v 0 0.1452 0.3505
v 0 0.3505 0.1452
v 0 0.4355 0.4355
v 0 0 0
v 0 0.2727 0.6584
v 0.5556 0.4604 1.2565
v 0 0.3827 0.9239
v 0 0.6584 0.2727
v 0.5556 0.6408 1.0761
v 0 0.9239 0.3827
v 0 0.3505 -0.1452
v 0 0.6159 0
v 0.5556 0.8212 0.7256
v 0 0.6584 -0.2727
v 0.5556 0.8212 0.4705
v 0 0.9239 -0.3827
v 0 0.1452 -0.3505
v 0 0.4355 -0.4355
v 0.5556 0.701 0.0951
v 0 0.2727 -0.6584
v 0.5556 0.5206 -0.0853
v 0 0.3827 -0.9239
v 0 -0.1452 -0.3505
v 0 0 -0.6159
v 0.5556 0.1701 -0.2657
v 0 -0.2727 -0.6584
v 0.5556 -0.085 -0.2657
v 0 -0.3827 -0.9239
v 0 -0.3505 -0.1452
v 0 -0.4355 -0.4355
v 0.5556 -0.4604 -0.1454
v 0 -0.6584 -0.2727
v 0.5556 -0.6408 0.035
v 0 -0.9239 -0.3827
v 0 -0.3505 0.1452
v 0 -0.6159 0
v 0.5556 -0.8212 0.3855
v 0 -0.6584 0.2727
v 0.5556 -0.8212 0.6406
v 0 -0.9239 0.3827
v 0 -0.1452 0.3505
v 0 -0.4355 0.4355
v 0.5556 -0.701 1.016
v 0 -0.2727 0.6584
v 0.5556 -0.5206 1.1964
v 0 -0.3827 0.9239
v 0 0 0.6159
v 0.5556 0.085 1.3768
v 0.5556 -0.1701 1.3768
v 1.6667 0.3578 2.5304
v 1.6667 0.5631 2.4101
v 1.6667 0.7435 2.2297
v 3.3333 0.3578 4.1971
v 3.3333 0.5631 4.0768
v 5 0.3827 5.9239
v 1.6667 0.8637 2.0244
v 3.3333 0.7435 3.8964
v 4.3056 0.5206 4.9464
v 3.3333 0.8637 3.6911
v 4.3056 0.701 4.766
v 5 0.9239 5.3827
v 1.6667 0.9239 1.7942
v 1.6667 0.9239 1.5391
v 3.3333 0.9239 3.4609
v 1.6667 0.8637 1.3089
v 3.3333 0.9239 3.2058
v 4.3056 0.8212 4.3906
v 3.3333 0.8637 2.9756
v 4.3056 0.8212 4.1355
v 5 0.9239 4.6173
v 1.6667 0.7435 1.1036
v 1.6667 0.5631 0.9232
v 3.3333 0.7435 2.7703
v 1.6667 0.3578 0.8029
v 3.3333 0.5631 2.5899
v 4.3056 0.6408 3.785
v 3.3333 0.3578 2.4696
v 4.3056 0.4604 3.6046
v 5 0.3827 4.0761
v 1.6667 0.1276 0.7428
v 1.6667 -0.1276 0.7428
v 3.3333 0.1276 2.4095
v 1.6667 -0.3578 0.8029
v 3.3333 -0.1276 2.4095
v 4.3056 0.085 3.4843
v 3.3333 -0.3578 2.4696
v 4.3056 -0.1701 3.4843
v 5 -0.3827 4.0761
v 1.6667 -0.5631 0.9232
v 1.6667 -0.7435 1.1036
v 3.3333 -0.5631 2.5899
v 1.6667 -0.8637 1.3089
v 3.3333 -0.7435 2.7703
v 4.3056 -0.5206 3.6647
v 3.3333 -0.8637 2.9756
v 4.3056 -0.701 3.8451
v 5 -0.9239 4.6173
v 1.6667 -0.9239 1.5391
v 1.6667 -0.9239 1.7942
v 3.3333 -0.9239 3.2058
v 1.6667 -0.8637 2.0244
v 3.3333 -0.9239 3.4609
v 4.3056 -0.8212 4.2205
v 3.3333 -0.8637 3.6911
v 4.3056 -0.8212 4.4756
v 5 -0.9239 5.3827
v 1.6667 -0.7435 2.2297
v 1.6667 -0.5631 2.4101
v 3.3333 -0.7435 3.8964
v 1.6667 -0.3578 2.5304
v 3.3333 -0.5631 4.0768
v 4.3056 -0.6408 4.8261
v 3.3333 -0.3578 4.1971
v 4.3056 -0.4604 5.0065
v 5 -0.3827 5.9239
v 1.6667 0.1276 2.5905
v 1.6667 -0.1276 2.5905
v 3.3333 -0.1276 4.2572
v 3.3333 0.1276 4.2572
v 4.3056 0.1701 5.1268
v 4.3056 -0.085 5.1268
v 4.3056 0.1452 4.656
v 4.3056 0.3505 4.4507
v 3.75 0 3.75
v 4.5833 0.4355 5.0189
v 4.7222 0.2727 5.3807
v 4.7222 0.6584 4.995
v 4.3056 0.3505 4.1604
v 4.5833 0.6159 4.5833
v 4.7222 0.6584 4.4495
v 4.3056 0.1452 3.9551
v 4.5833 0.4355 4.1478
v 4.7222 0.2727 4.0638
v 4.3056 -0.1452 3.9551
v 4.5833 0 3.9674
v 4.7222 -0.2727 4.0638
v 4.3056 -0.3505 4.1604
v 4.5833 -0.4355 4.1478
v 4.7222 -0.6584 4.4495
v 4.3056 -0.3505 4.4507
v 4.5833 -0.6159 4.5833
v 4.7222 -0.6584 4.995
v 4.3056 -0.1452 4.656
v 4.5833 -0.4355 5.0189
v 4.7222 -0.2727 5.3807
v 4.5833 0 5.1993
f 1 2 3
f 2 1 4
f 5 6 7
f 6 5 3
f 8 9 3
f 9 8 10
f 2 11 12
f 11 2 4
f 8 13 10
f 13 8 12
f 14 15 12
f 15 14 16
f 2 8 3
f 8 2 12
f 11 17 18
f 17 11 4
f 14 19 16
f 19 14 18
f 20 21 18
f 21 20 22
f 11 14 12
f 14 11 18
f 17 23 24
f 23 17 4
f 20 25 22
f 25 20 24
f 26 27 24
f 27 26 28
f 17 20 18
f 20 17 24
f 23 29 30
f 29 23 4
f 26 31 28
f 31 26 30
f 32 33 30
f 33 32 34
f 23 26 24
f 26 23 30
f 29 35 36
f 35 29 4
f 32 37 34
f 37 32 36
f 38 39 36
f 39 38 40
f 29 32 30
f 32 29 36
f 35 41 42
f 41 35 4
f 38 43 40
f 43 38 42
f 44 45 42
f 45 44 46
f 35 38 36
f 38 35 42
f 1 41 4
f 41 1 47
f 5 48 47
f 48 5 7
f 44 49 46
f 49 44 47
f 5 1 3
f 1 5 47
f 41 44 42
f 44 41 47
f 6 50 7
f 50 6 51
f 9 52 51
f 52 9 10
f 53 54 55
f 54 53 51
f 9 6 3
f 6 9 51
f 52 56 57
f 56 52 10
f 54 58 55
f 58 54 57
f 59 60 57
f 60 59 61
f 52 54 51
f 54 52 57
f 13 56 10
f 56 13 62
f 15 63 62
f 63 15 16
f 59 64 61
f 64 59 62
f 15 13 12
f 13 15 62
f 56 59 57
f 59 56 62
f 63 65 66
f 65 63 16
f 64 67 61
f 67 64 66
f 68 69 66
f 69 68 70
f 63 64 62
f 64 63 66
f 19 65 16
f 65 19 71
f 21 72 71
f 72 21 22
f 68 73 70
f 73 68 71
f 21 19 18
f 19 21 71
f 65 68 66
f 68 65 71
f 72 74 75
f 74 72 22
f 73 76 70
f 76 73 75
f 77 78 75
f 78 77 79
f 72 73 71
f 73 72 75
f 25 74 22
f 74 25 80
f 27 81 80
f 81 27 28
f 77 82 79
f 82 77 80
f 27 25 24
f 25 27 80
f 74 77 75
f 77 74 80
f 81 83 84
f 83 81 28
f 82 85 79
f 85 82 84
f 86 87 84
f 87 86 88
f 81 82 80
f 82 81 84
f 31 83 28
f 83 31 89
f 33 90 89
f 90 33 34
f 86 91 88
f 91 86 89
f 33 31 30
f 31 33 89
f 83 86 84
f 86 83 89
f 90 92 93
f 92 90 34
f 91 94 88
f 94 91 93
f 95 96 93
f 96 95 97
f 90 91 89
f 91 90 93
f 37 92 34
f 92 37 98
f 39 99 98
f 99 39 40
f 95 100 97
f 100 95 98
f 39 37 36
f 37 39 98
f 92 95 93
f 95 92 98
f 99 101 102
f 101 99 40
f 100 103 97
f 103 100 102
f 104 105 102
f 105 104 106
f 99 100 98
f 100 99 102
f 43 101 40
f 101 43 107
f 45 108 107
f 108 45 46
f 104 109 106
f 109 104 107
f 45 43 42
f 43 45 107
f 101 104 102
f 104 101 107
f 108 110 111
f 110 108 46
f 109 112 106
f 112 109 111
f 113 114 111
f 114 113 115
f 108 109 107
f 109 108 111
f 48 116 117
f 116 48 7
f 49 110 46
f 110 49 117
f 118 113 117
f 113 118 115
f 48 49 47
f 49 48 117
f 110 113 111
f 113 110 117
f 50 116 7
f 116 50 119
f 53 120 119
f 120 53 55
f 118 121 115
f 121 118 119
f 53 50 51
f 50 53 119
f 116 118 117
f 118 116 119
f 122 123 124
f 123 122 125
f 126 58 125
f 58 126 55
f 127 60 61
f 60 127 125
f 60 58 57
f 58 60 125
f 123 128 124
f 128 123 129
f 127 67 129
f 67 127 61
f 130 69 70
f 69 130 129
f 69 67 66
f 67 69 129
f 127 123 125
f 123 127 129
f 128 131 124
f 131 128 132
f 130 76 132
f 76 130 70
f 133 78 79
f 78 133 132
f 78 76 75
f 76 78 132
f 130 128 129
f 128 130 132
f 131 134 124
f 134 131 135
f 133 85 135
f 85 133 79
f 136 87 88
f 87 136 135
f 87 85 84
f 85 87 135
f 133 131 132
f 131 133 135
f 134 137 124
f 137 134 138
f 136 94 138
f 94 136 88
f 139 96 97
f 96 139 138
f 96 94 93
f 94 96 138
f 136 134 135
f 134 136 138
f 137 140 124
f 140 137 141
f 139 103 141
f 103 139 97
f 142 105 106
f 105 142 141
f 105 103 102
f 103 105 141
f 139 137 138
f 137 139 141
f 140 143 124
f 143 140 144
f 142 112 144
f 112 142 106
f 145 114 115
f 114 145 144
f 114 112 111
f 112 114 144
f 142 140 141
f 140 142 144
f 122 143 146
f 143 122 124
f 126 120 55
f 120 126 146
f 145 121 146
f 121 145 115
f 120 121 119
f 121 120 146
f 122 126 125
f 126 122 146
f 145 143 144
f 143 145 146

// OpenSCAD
function tiny() = [
[[1,1,-1],[1.30656,0.541196,-1],[1.41421,-0,-1],[1.30656,-0.541196,-1],[1,-1,-1],[0.541196,-1.30656,-1],[0,-1.41421,-1],[-0.541196,-1.30656,-1],[-1,-1,-1],[-1.30656,-0.541196,-1],[-1.41421,0,-1],[-1.30656,0.541196,-1],[-1,1,-1],[-0.541195,1.30656,-1],[0.006,1.41421,-1],[0.541197,1.30656,-1],[1,0.999999,1],[1.30656,0.541195,1],[1.41421,-0.006,1],[1.30656,-0.541198,1],[0.999998,-1,1],[0.541194,-1.30656,1],[-0.006,-1.41421,1],[-0.541199,-1.30656,1],[-1,-0.999998,1],[-1.30656,-0.541193,1],[-1.41421,0.006,1],[-1.30656,0.5412,1],[-0.999997,1,1],[-0.541192,1.30657,1],[0.006,1.41421,1],[0.541201,1.30656,1],[0,0,-1],[0,0,1]],

[[32,0,1],[33,17,16],[32,1,2],[33,18,17],[32,2,3],[33,19,18],[32,3,4],[33,20,19],[32,4,5],[33,21,20],[32,5,6],[33,22,21],[32,6,7],[33,23,22],[32,7,8],[33,24,23],[32,8,9],[33,25,24],[32,9,10],[33,26,25],[32,10,11],[33,27,26],[32,11,12],[33,28,27],[32,12,13],[33,29,28],[32,13,14],[33,30,29],[32,14,15],[33,31,30],[15,0,32],[33,16,31],[0,16,17],[0,17,1],[1,17,18],[1,18,2],[2,18,19],[2,19,3],[3,19,20],[3,20,4],[4,20,21],[4,21,5],[5,21,22],[5,22,6],[6,22,23],[6,23,7],[7,23,24],[7,24,8],[8,24,25],[8,25,9],[9,25,26],[9,26,10],[10,26,27],[10,27,11],[11,27,28],[11,28,12],[12,28,29],[12,29,13],[13,29,30],[13,30,14],[14,30,31],[14,31,15],[16,0,15],[16,15,31]]];


function ringtrans(v, t) = [
  for (i = [0: len(v) - 1])
    [
      v[i][0] + t[0],
      v[i][1] + t[1],
      v[i][2] + t[2]
    ]
];

function xring(x = 8,n=0 ) = concat([[n*0.75,0,n*0.75]],[  for (i = [(360 / x) * 0.5: 360 / x: 359])[n, sin(i), n+cos(i)]]);

d=[concat(xring(8,0),xring(8,5)),[
[0,1,2],[0,2,3],[0,3,4],[0,4,5],[0,5,6],[0,6,7],[0,7,8],[0,8,1],

[2,1,10],[2,10,11],[3,2,11],[3,11,12],[4,3,12],[4,12,13],[5,4,13],[5,13,14],
[6,5,14],[6,14,15],[7,6,15],[7,15,16],[8,7,16],[8,16,17],[1,8,17],[1,17,10],

[10,9,11],[11,9,12],[12,9,13],[13,9,14],[14,9,15],[15,9,16],[16,9,17],[17,9,10]
]]
;

//polyhedron(d[0],d[1]);
t=cc(d,2);
echo(t);
 polyhedron(t[0],t[1]) ;

 


function cc(V,n=1)=n<=0?V:n==1?
let(w=V)
let(ed=quicksort(quicksort(quicksort(quicksort(de(w[1],len(w[0])-1),2),1),0),1))

[nv(w),nf(ed)]
:let(w=cc(V,n-1))
let(ed=quicksort(quicksort(quicksort(quicksort(de(w[1],len(w[0])-1),2),1),0),1))

[nv(w),nf(ed)]
;


function nv(v)=concat(v[0],[for(i=[0:len(v[1])-1]) (v[0][v[1][i][0]]+v[0][v[1][i][1]]+v[0][v[1][i][2]])/3 ]);
function nf(hf)=
[for(i=[0:1:len(hf)-1])
(i%2)==0?
[hf[i][4],hf[(i+1)%len(hf)][2],hf[i][2]]
:
[hf[i][4],hf[(i-1)%len(hf)][2],hf[i][2]]
];

function de(faces,points) =
let(l=len(faces)-1)
   [for (i=[0:l])
    let(f = faces[i])
       for (j=[0:len(f)-1])
          let(p=f[j],q=f[(j+1)%len(f)])
              [min(p,q),max(p,q),i+points+1,p,q]  // no duplicates
   ];

function quicksort(arr,o) = !(len(arr)>0) ? [] : let(
    pivot   = arr[floor(len(arr)/2)],
    lesser  = [ for (y = arr) if (y[o]  < pivot[o]) y ],
    equal   = [ for (y = arr) if (y[o] == pivot[o]) y ],
    greater = [ for (y = arr) if (y[o]  > pivot[o]) y ]
) 
concat(
    quicksort(lesser,o), equal, quicksort(greater,o)
);

function weld(v)=let(data=v[0])
[v[0],[for (i= [0:len(v[1])-1])let(index1=v[1][i][0],index2=v[1][i][1],index3=v[1][i][2])

concat(search(data[index1][0],data),search(data[index2][0],data),search(data[index3][0],data,1))
]];



function bunny()= [[[29.22,18.7,44.53],[46.15,16.62,49.96],[36.51,26.35,43.72],[46.75,-33.68,10.3],[55.25,-29.12,14.6],[55.13,-33.81,21.71],[31.11,26.49,112.43],[23.36,20.39,106.93],[29.54,11.76,111.69],[13.97,-17.52,65.43],[12.46,-27.63,52.31],[27.16,-20.21,64.58],[29.22,18.7,44.53],[21.05,14.74,31.48],[5.59,20.2,48.56],[56.67,18.93,42.75],[63.93,15.73,34.69],[36.51,26.35,43.72],[-19.51,-24.39,57.55],[-22.72,-26.36,64.22],[-22.55,-7.86,60.11],[63.09,13.91,22.04],[74.1,-2.43,25.02],[65.39,1.68,12.97],[8.38,43.98,107.66],[18.3,45.19,97.11],[6.27,42.75,90.71],[56.43,12.56,14.2],[49.96,21.49,29.36],[63.09,13.91,22.04],[7.37,-20.27,19.88],[10.06,-10.79,10.21],[7.33,-24.84,15.42],[49.96,21.49,29.36],[38.37,19.97,16.78],[28.56,26.42,32.56],[-1.81,-7.48,11.85],[-0.45,-12.88,5.25],[10.06,-10.79,10.21],[10.39,6.12,14.84],[31.86,17.09,15.07],[13.46,17.5,8.85],[4.8,10.32,78.93],[9.65,7.29,79.93],[11.32,10.69,68.51],[82.99,-9.75,31.68],[82.01,-22.44,25.69],[84.23,-10.8,23.27],[16.21,41,112.51],[18.3,45.19,97.11],[8.38,43.98,107.66],[4.8,10.32,78.93],[3.33,19.61,82.53],[4.8,14.35,89.17],[-23.88,-7.02,67.72],[-17.01,6.63,62.73],[-22.55,-7.86,60.11],[10.39,-3.88,89.7],[22.61,2.45,96.78],[7.05,-3.02,92.85],[19.87,-37.05,7.22],[31.45,-34.74,15.38],[17.84,-29.94,17.25],[28.9,20.6,94.55],[36.36,19.84,93.38],[9.65,7.29,79.93],[59.22,11.88,63.99],[68.24,9.49,51.54],[57.81,13.2,53.83],[77.16,-20.24,40.03],[64.27,-29.07,17.08],[75.23,-20.46,30.35],[38.19,23.46,110.77],[36.36,19.84,93.38],[35.36,30.64,105.76],[75.23,-20.46,30.35],[82.01,-22.44,25.69],[82.99,-9.75,31.68],[55.15,-35.4,50.34],[71.84,-25.79,51.51],[62.42,-28.38,60.18],[76.14,-2.21,55.11],[77.16,-20.24,40.03],[77.44,-9.29,31.78],[-20.51,-9.21,46.44],[-15.61,-19.23,41.25],[-15.29,-17.33,55.17],[48.75,-10.75,75.24],[63.76,-6.07,69.47],[50.79,1.5,72.23],[-16.08,1.18,36.27],[-7.13,-15.08,23.83],[-10.1,-20.98,31.13],[59.22,11.88,63.99],[76.14,-2.21,55.11],[68.24,9.49,51.54],[13.18,0.51,81.56],[16.88,-3.67,71.5],[9.65,7.29,79.93],[-7.09,11.37,82.82],[6.27,42.75,90.71],[4.59,36.35,84.12],[-17.36,-2.17,54.55],[-17.01,6.63,62.73],[-5.46,11.13,58.63],[5.59,20.2,48.56],[-8.19,14.45,44.9],[-5.46,11.13,58.63],[3.33,19.61,82.53],[4.8,10.32,78.93],[-2.56,12.45,77.94],[1.88,37.06,110.21],[16.21,41,112.51],[8.38,43.98,107.66],[-2.58,3.29,90.29],[7.05,-3.02,92.85],[9.67,4.99,100.12],[-4.2,-8.04,93.74],[7.05,-3.02,92.85],[-2.58,3.29,90.29],[4.8,14.35,89.17],[-2.58,3.29,90.29],[6.38,8.42,90.64],[-21.59,-5.9,86.37],[-14.11,-16.9,88.4],[-4.2,-8.04,93.74],[-23.88,-7.02,67.72],[-20.01,-24.49,77.26],[-19.34,-1.29,78.16],[76.14,-2.21,55.11],[77.44,-9.29,31.78],[74.17,6.97,41.44],[3.63,-19.4,88.53],[-14.11,-16.9,88.4],[-6.77,-27.36,83.07],[63.09,13.91,22.04],[65.39,1.68,12.97],[56.43,12.56,14.2],[-16.08,1.18,36.27],[-8.19,14.45,44.9],[-7.55,1.5,24.98],[11.32,10.69,68.51],[5.59,20.2,48.56],[-5.46,11.13,58.63],[16.29,-30.71,28.9],[7.37,-20.27,19.88],[17.84,-29.94,17.25],[8.9,5.37,5.27],[10.39,6.12,14.84],[13.46,17.5,8.85],[54.83,12.99,5.35],[54.92,-0.26,5.37],[22.39,18.55,5.31],[-17.36,-2.17,54.55],[-16.08,1.18,36.27],[-20.51,-9.21,46.44],[50.79,1.5,72.23],[63.76,-6.07,69.47],[59.22,11.88,63.99],[-6.77,-27.36,83.07],[-14.11,-16.9,88.4],[-20.01,-24.49,77.26],[47.88,-23.29,72.03],[48.75,-10.75,75.24],[27.16,-20.21,64.58],[6.38,8.42,90.64],[4.8,10.32,78.93],[4.8,14.35,89.17],[42.55,-31.09,64.35],[62.42,-28.38,60.18],[47.88,-23.29,72.03],[22.39,18.55,5.31],[54.92,-0.26,5.37],[-6.45,-22.76,5.37],[8.38,43.98,107.66],[-4.46,33.05,103.48],[1.88,37.06,110.21],[32.65,16.57,59.56],[46.15,16.62,49.96],[29.22,18.7,44.53],[21.05,14.74,31.48],[31.86,17.09,15.07],[6.23,4.27,21.56],[-4.71,-24.59,55.31],[-15.61,-19.23,41.25],[-1.69,-30.41,44.65],[6.38,8.42,90.64],[28.9,20.6,94.55],[9.65,7.29,79.93],[74.37,-16.98,5.28],[82.01,-22.44,25.69],[67.26,-25.76,5.33],[76.14,-2.21,55.11],[59.22,11.88,63.99],[63.76,-6.07,69.47],[57.81,13.2,53.83],[68.24,9.49,51.54],[56.67,18.93,42.75],[-5.43,1.44,7.63],[8.9,5.37,5.27],[-0.45,-12.88,5.25],[22.39,18.55,5.31],[13.46,17.5,8.85],[31.86,17.09,15.07],[54.83,12.99,5.35],[56.43,12.56,14.2],[54.92,-0.26,5.37],[42.55,-31.09,64.35],[47.88,-23.29,72.03],[27.16,-20.21,64.58],[76.14,-2.21,55.11],[63.76,-6.07,69.47],[67.75,-19.78,64.53],[42.71,-41.42,30.45],[62.88,-34.11,37.38],[49.2,-39.96,41.97],[27.72,-39.77,41.86],[31.18,-41.3,27.11],[39.49,-40.3,46.21],[36.51,26.35,43.72],[28.56,26.42,32.56],[29.22,18.7,44.53],[-17.36,-2.17,54.55],[-8.19,14.45,44.9],[-16.08,1.18,36.27],[31.86,17.09,15.07],[28.56,26.42,32.56],[38.37,19.97,16.78],[29.23,1.37,68.7],[48.75,-10.75,75.24],[50.79,1.5,72.23],[-20.51,-9.21,46.44],[-15.29,-17.33,55.17],[-17.36,-2.17,54.55],[28.56,26.42,32.56],[31.86,17.09,15.07],[21.05,14.74,31.48],[31.11,26.49,112.43],[38.19,23.46,110.77],[35.36,30.64,105.76],[13.46,17.5,8.85],[22.39,18.55,5.31],[8.9,5.37,5.27],[-9.31,8.58,87.9],[-19.34,-1.29,78.16],[-21.59,-5.9,86.37],[1.37,-29.63,8.03],[7.33,-24.84,15.42],[-6.45,-22.76,5.37],[-4.24,23.64,94.46],[-7.09,11.37,82.82],[-9.31,8.58,87.9],[-22.72,-26.36,64.22],[-20.01,-24.49,77.26],[-22.55,-7.86,60.11],[-4.71,-24.59,55.31],[12.46,-27.63,52.31],[13.97,-17.52,65.43],[7.05,-3.02,92.85],[29.54,11.76,111.69],[9.67,4.99,100.12],[-20.01,-24.49,77.26],[-14.48,-32.9,70.88],[-6.77,-27.36,83.07],[56.67,18.93,42.75],[36.51,26.35,43.72],[46.15,16.62,49.96],[-2.56,12.45,77.94],[4.8,10.32,78.93],[11.32,10.69,68.51],[-0.45,-12.88,5.25],[-1.81,-7.48,11.85],[-5.43,1.44,7.63],[4.8,14.35,89.17],[3.33,19.61,82.53],[19.48,38.63,93.62],[11.32,10.69,68.51],[17.37,15.59,62.43],[5.59,20.2,48.56],[-6.45,-22.76,5.37],[10.06,-10.79,10.21],[-0.45,-12.88,5.25],[43.6,11.6,63.72],[29.23,1.37,68.7],[50.79,1.5,72.23],[19.48,38.63,93.62],[21.24,36.32,104.22],[4.8,14.35,89.17],[5.31,-16.99,80.26],[-5.81,-33.93,62.8],[1.5,-25.91,65],[13.18,0.51,81.56],[13.97,-17.52,65.43],[16.88,-3.67,71.5],[-9.31,8.58,87.9],[-7.09,11.37,82.82],[-19.34,-1.29,78.16],[5.31,-16.99,80.26],[13.97,-17.52,65.43],[10.39,-3.88,89.7],[31.18,-41.3,27.11],[46.75,-33.68,10.3],[42.71,-41.42,30.45],[-17.01,6.63,62.73],[-17.36,-2.17,54.55],[-22.55,-7.86,60.11],[76.14,-2.21,55.11],[74.17,6.97,41.44],[68.24,9.49,51.54],[67.26,-25.76,5.33],[-6.45,-22.76,5.37],[70.47,-5.59,5.29],[54.92,-0.26,5.37],[65.39,1.68,12.97],[70.47,-5.59,5.29],[71.84,-25.79,51.51],[62.88,-34.11,37.38],[77.16,-20.24,40.03],[12.46,-27.63,52.31],[-4.71,-24.59,55.31],[-1.69,-30.41,44.65],[5.59,20.2,48.56],[32.65,16.57,59.56],[29.22,18.7,44.53],[27.16,-20.21,64.58],[23.54,-31.61,47.89],[42.55,-31.09,64.35],[-1.42,-28.69,35.92],[7.37,-20.27,19.88],[16.29,-30.71,28.9],[23.36,20.39,106.93],[28.9,20.6,94.55],[6.38,8.42,90.64],[41.23,26.83,32.63],[28.56,26.42,32.56],[36.51,26.35,43.72],[18.3,45.19,97.11],[4.59,36.35,84.12],[6.27,42.75,90.71],[16.21,41,112.51],[21.24,36.32,104.22],[18.3,45.19,97.11],[-9.31,8.58,87.9],[-21.59,-5.9,86.37],[-2.58,3.29,90.29],[82.99,-9.75,31.68],[79.97,-3.08,21.75],[74.1,-2.43,25.02],[9.67,4.99,100.12],[23.36,20.39,106.93],[6.38,8.42,90.64],[55.15,-35.4,50.34],[62.42,-28.38,60.18],[39.49,-40.3,46.21],[-20.01,-24.49,77.26],[-22.72,-26.36,64.22],[-14.48,-32.9,70.88],[55.13,-33.81,21.71],[64.27,-29.07,17.08],[62.88,-34.11,37.38],[5.31,-16.99,80.26],[1.5,-25.91,65],[13.97,-17.52,65.43],[62.42,-28.38,60.18],[42.55,-31.09,64.35],[39.49,-40.3,46.21],[36.36,19.84,93.38],[28.9,20.6,94.55],[30.04,30.6,103.61],[32.65,16.57,59.56],[29.23,1.37,68.7],[43.6,11.6,63.72],[42.55,-31.09,64.35],[23.54,-31.61,47.89],[27.72,-39.77,41.86],[-0.45,-12.88,5.25],[22.39,18.55,5.31],[-6.45,-22.76,5.37],[-7.09,11.37,82.82],[-17.01,6.63,62.73],[-19.34,-1.29,78.16],[-1.42,-28.69,35.92],[-1.69,-30.41,44.65],[-10.1,-20.98,31.13],[10.39,-3.88,89.7],[13.97,-17.52,65.43],[13.18,0.51,81.56],[75.23,-20.46,30.35],[82.99,-9.75,31.68],[77.44,-9.29,31.78],[82.99,-9.75,31.68],[84.23,-10.8,23.27],[79.97,-3.08,21.75],[23.54,-31.61,47.89],[16.29,-30.71,28.9],[27.72,-39.77,41.86],[29.23,1.37,68.7],[32.65,16.57,59.56],[11.32,10.69,68.51],[46.47,-32.18,5.31],[-6.45,-22.76,5.37],[67.26,-25.76,5.33],[2.11,16.71,32.44],[21.05,14.74,31.48],[6.23,4.27,21.56],[16.29,-30.71,28.9],[23.54,-31.61,47.89],[12.46,-27.63,52.31],[8.9,5.37,5.27],[-5.43,1.44,7.63],[10.39,6.12,14.84],[67.26,-25.76,5.33],[82.01,-22.44,25.69],[75.23,-20.46,30.35],[41.23,26.83,32.63],[49.96,21.49,29.36],[28.56,26.42,32.56],[23.36,20.39,106.93],[9.67,4.99,100.12],[29.54,11.76,111.69],[38.19,23.46,110.77],[31.11,26.49,112.43],[29.54,11.76,111.69],[-2.56,12.45,77.94],[-5.46,11.13,58.63],[-7.09,11.37,82.82],[-19.51,-24.39,57.55],[-5.81,-33.93,62.8],[-14.48,-32.9,70.88],[31.11,26.49,112.43],[35.36,30.64,105.76],[30.04,30.6,103.61],[31.18,-41.3,27.11],[27.72,-39.77,41.86],[16.29,-30.71,28.9],[5.31,-16.99,80.26],[-6.77,-27.36,83.07],[-5.81,-33.93,62.8],[9.67,4.99,100.12],[6.38,8.42,90.64],[-2.58,3.29,90.29],[74.17,6.97,41.44],[77.44,-9.29,31.78],[74.1,-2.43,25.02],[22.61,2.45,96.78],[29.54,11.76,111.69],[7.05,-3.02,92.85],[74.1,-2.43,25.02],[77.44,-9.29,31.78],[82.99,-9.75,31.68],[56.43,12.56,14.2],[54.83,12.99,5.35],[31.86,17.09,15.07],[12.69,-28.18,5.31],[17.84,-29.94,17.25],[7.33,-24.84,15.42],[82.01,-22.44,25.69],[74.37,-16.98,5.28],[84.23,-10.8,23.27],[7.37,-20.27,19.88],[6.41,-6.82,13.85],[10.06,-10.79,10.21],[48.75,-10.75,75.24],[29.23,1.37,68.7],[27.16,-20.21,64.58],[19.87,-37.05,7.22],[12.69,-28.18,5.31],[46.47,-32.18,5.31],[54.92,-0.26,5.37],[70.47,-5.59,5.29],[-6.45,-22.76,5.37],[-21.59,-5.9,86.37],[-19.34,-1.29,78.16],[-20.01,-24.49,77.26],[29.22,18.7,44.53],[28.56,26.42,32.56],[21.05,14.74,31.48],[-4.46,33.05,103.48],[8.38,43.98,107.66],[3.26,34.31,94.08],[-21.59,-5.9,86.37],[-4.2,-8.04,93.74],[-2.58,3.29,90.29],[12.46,-27.63,52.31],[23.54,-31.61,47.89],[27.16,-20.21,64.58],[32.65,16.57,59.56],[57.81,13.2,53.83],[46.15,16.62,49.96],[10.6,28.95,101.51],[16.21,41,112.51],[1.88,37.06,110.21],[46.47,-32.18,5.31],[46.75,-33.68,10.3],[31.45,-34.74,15.38],[17.84,-29.94,17.25],[7.37,-20.27,19.88],[7.33,-24.84,15.42],[-5.43,1.44,7.63],[-1.81,-7.48,11.85],[6.41,-6.82,13.85],[-6.77,-27.36,83.07],[5.31,-16.99,80.26],[3.63,-19.4,88.53],[63.93,15.73,34.69],[63.09,13.91,22.04],[49.96,21.49,29.36],[39.49,-40.3,46.21],[42.71,-41.42,30.45],[49.2,-39.96,41.97],[42.55,-31.09,64.35],[27.72,-39.77,41.86],[39.49,-40.3,46.21],[59.22,11.88,63.99],[57.81,13.2,53.83],[43.6,11.6,63.72],[2.11,16.71,32.44],[-7.55,1.5,24.98],[-8.19,14.45,44.9],[19.87,-37.05,7.22],[46.47,-32.18,5.31],[31.45,-34.74,15.38],[5.31,-16.99,80.26],[10.39,-3.88,89.7],[3.63,-19.4,88.53],[-4.46,33.05,103.48],[3.26,34.31,94.08],[-4.24,23.64,94.46],[8.9,5.37,5.27],[22.39,18.55,5.31],[-0.45,-12.88,5.25],[67.75,-19.78,64.53],[62.42,-28.38,60.18],[71.84,-25.79,51.51],[-1.42,-28.69,35.92],[16.29,-30.71,28.9],[-1.69,-30.41,44.65],[6.23,4.27,21.56],[10.39,6.12,14.84],[6.41,-6.82,13.85],[55.25,-29.12,14.6],[46.47,-32.18,5.31],[67.26,-25.76,5.33],[10.39,6.12,14.84],[6.23,4.27,21.56],[31.86,17.09,15.07],[55.13,-33.81,21.71],[55.25,-29.12,14.6],[64.27,-29.07,17.08],[11.32,10.69,68.51],[16.88,-3.67,71.5],[29.23,1.37,68.7],[67.75,-19.78,64.53],[48.75,-10.75,75.24],[47.88,-23.29,72.03],[7.33,-24.84,15.42],[1.37,-29.63,8.03],[12.69,-28.18,5.31],[63.93,15.73,34.69],[56.67,18.93,42.75],[68.24,9.49,51.54],[-20.51,-9.21,46.44],[-10.1,-20.98,31.13],[-15.61,-19.23,41.25],[-4.71,-24.59,55.31],[13.97,-17.52,65.43],[1.5,-25.91,65],[48.75,-10.75,75.24],[67.75,-19.78,64.53],[63.76,-6.07,69.47],[-2.56,12.45,77.94],[11.32,10.69,68.51],[-5.46,11.13,58.63],[77.16,-20.24,40.03],[75.23,-20.46,30.35],[77.44,-9.29,31.78],[-15.29,-17.33,55.17],[-15.61,-19.23,41.25],[-4.71,-24.59,55.31],[5.59,20.2,48.56],[2.11,16.71,32.44],[-8.19,14.45,44.9],[21.24,36.32,104.22],[19.48,38.63,93.62],[18.3,45.19,97.11],[16.29,-30.71,28.9],[12.46,-27.63,52.31],[-1.69,-30.41,44.65],[74.1,-2.43,25.02],[63.93,15.73,34.69],[74.17,6.97,41.44],[4.59,36.35,84.12],[-2.56,12.45,77.94],[-7.09,11.37,82.82],[-16.08,1.18,36.27],[-7.55,1.5,24.98],[-7.13,-15.08,23.83],[-20.51,-9.21,46.44],[-16.08,1.18,36.27],[-10.1,-20.98,31.13],[10.6,28.95,101.51],[21.24,36.32,104.22],[16.21,41,112.51],[10.39,-3.88,89.7],[-4.2,-8.04,93.74],[3.63,-19.4,88.53],[3.33,19.61,82.53],[-2.56,12.45,77.94],[4.59,36.35,84.12],[74.1,-2.43,25.02],[63.09,13.91,22.04],[63.93,15.73,34.69],[3.26,34.31,94.08],[6.27,42.75,90.71],[-7.09,11.37,82.82],[67.75,-19.78,64.53],[71.84,-25.79,51.51],[76.14,-2.21,55.11],[10.06,-10.79,10.21],[-6.45,-22.76,5.37],[7.33,-24.84,15.42],[38.37,19.97,16.78],[56.43,12.56,14.2],[31.86,17.09,15.07],[62.42,-28.38,60.18],[67.75,-19.78,64.53],[47.88,-23.29,72.03],[-4.71,-24.59,55.31],[1.5,-25.91,65],[-5.81,-33.93,62.8],[-5.46,11.13,58.63],[-8.19,14.45,44.9],[-17.36,-2.17,54.55],[-7.55,1.5,24.98],[2.11,16.71,32.44],[6.23,4.27,21.56],[30.04,30.6,103.61],[35.36,30.64,105.76],[36.36,19.84,93.38],[22.61,2.45,96.78],[38.19,23.46,110.77],[29.54,11.76,111.69],[-2.15,20.62,100.33],[-4.24,23.64,94.46],[-9.31,8.58,87.9],[79.97,-3.08,21.75],[70.47,-5.59,5.29],[74.1,-2.43,25.02],[-10.1,-20.98,31.13],[-7.13,-15.08,23.83],[7.37,-20.27,19.88],[17.84,-29.94,17.25],[12.69,-28.18,5.31],[19.87,-37.05,7.22],[67.26,-25.76,5.33],[75.23,-20.46,30.35],[64.27,-29.07,17.08],[10.39,-3.88,89.7],[13.18,0.51,81.56],[22.61,2.45,96.78],[-4.46,33.05,103.48],[-4.24,23.64,94.46],[-2.15,20.62,100.33],[36.36,19.84,93.38],[13.18,0.51,81.56],[9.65,7.29,79.93],[74.37,-16.98,5.28],[67.26,-25.76,5.33],[70.47,-5.59,5.29],[39.49,-40.3,46.21],[31.18,-41.3,27.11],[42.71,-41.42,30.45],[-15.29,-17.33,55.17],[-22.55,-7.86,60.11],[-17.36,-2.17,54.55],[1.37,-29.63,8.03],[-6.45,-22.76,5.37],[12.69,-28.18,5.31],[8.38,43.98,107.66],[6.27,42.75,90.71],[3.26,34.31,94.08],[4.59,36.35,84.12],[19.48,38.63,93.62],[3.33,19.61,82.53],[10.06,-10.79,10.21],[6.41,-6.82,13.85],[-1.81,-7.48,11.85],[56.43,12.56,14.2],[65.39,1.68,12.97],[54.92,-0.26,5.37],[79.97,-3.08,21.75],[84.23,-10.8,23.27],[70.47,-5.59,5.29],[-7.55,1.5,24.98],[6.23,4.27,21.56],[-7.13,-15.08,23.83],[77.16,-20.24,40.03],[62.88,-34.11,37.38],[64.27,-29.07,17.08],[-2.15,20.62,100.33],[-9.31,8.58,87.9],[-2.58,3.29,90.29],[29.23,1.37,68.7],[16.88,-3.67,71.5],[27.16,-20.21,64.58],[17.84,-29.94,17.25],[31.45,-34.74,15.38],[31.18,-41.3,27.11],[2.11,16.71,32.44],[5.59,20.2,48.56],[21.05,14.74,31.48],[43.6,11.6,63.72],[57.81,13.2,53.83],[32.65,16.57,59.56],[50.79,1.5,72.23],[59.22,11.88,63.99],[43.6,11.6,63.72],[36.51,26.35,43.72],[49.96,21.49,29.36],[41.23,26.83,32.63],[28.9,20.6,94.55],[23.36,20.39,106.93],[30.04,30.6,103.61],[-5.43,1.44,7.63],[6.41,-6.82,13.85],[10.39,6.12,14.84],[19.48,38.63,93.62],[4.59,36.35,84.12],[18.3,45.19,97.11],[31.18,-41.3,27.11],[16.29,-30.71,28.9],[17.84,-29.94,17.25],[-21.59,-5.9,86.37],[-20.01,-24.49,77.26],[-14.11,-16.9,88.4],[-22.72,-26.36,64.22],[-19.51,-24.39,57.55],[-14.48,-32.9,70.88],[55.15,-35.4,50.34],[39.49,-40.3,46.21],[49.2,-39.96,41.97],[63.93,15.73,34.69],[68.24,9.49,51.54],[74.17,6.97,41.44],[3.26,34.31,94.08],[-7.09,11.37,82.82],[-4.24,23.64,94.46],[62.88,-34.11,37.38],[42.71,-41.42,30.45],[55.13,-33.81,21.71],[22.61,2.45,96.78],[13.18,0.51,81.56],[35.53,14.81,95.24],[-2.58,3.29,90.29],[4.8,14.35,89.17],[10.6,28.95,101.51],[16.88,-3.67,71.5],[13.97,-17.52,65.43],[27.16,-20.21,64.58],[35.53,14.81,95.24],[38.19,23.46,110.77],[22.61,2.45,96.78],[74.1,-2.43,25.02],[70.47,-5.59,5.29],[65.39,1.68,12.97],[-20.01,-24.49,77.26],[-23.88,-7.02,67.72],[-22.55,-7.86,60.11],[6.23,4.27,21.56],[7.37,-20.27,19.88],[-7.13,-15.08,23.83],[71.84,-25.79,51.51],[77.16,-20.24,40.03],[76.14,-2.21,55.11],[-2.15,20.62,100.33],[1.88,37.06,110.21],[-4.46,33.05,103.48],[4.8,14.35,89.17],[21.24,36.32,104.22],[10.6,28.95,101.51],[-4.71,-24.59,55.31],[-19.51,-24.39,57.55],[-15.29,-17.33,55.17],[49.96,21.49,29.36],[56.43,12.56,14.2],[38.37,19.97,16.78],[31.18,-41.3,27.11],[31.45,-34.74,15.38],[46.75,-33.68,10.3],[-4.2,-8.04,93.74],[-14.11,-16.9,88.4],[3.63,-19.4,88.53],[-10.1,-20.98,31.13],[7.37,-20.27,19.88],[-1.42,-28.69,35.92],[55.15,-35.4,50.34],[62.88,-34.11,37.38],[71.84,-25.79,51.51],[-19.51,-24.39,57.55],[-22.55,-7.86,60.11],[-15.29,-17.33,55.17],[55.15,-35.4,50.34],[49.2,-39.96,41.97],[62.88,-34.11,37.38],[84.23,-10.8,23.27],[74.37,-16.98,5.28],[70.47,-5.59,5.29],[-7.09,11.37,82.82],[-5.46,11.13,58.63],[-17.01,6.63,62.73],[63.93,15.73,34.69],[49.96,21.49,29.36],[36.51,26.35,43.72],[32.65,16.57,59.56],[5.59,20.2,48.56],[17.37,15.59,62.43],[7.05,-3.02,92.85],[-4.2,-8.04,93.74],[10.39,-3.88,89.7],[-4.71,-24.59,55.31],[-5.81,-33.93,62.8],[-19.51,-24.39,57.55],[6.41,-6.82,13.85],[7.37,-20.27,19.88],[6.23,4.27,21.56],[17.37,15.59,62.43],[11.32,10.69,68.51],[32.65,16.57,59.56],[31.86,17.09,15.07],[54.83,12.99,5.35],[22.39,18.55,5.31],[6.38,8.42,90.64],[9.65,7.29,79.93],[4.8,10.32,78.93],[-19.34,-1.29,78.16],[-17.01,6.63,62.73],[-23.88,-7.02,67.72],[46.75,-33.68,10.3],[46.47,-32.18,5.31],[55.25,-29.12,14.6],[-15.61,-19.23,41.25],[-10.1,-20.98,31.13],[-1.69,-30.41,44.65],[-5.81,-33.93,62.8],[-6.77,-27.36,83.07],[-14.48,-32.9,70.88],[-2.15,20.62,100.33],[-2.58,3.29,90.29],[10.6,28.95,101.51],[12.69,-28.18,5.31],[-6.45,-22.76,5.37],[46.47,-32.18,5.31],[57.81,13.2,53.83],[56.67,18.93,42.75],[46.15,16.62,49.96],[46.75,-33.68,10.3],[55.13,-33.81,21.71],[42.71,-41.42,30.45],[-2.15,20.62,100.33],[10.6,28.95,101.51],[1.88,37.06,110.21],[30.04,30.6,103.61],[23.36,20.39,106.93],[31.11,26.49,112.43],[55.25,-29.12,14.6],[67.26,-25.76,5.33],[64.27,-29.07,17.08],[9.65,7.29,79.93],[16.88,-3.67,71.5],[11.32,10.69,68.51],[35.53,14.81,95.24],[13.18,0.51,81.56],[36.36,19.84,93.38],[38.19,23.46,110.77],[35.53,14.81,95.24],[36.36,19.84,93.38]],[[0,1,2],[3,4,5],[6,7,8],[9,10,11],[12,13,14],[15,16,17],[18,19,20],[21,22,23],[24,25,26],[27,28,29],[30,31,32],[33,34,35],[36,37,38],[39,40,41],[42,43,44],[45,46,47],[48,49,50],[51,52,53],[54,55,56],[57,58,59],[60,61,62],[63,64,65],[66,67,68],[69,70,71],[72,73,74],[75,76,77],[78,79,80],[81,82,83],[84,85,86],[87,88,89],[90,91,92],[93,94,95],[96,97,98],[99,100,101],[102,103,104],[105,106,107],[108,109,110],[111,112,113],[114,115,116],[117,118,119],[120,121,122],[123,124,125],[126,127,128],[129,130,131],[132,133,134],[135,136,137],[138,139,140],[141,142,143],[144,145,146],[147,148,149],[150,151,152],[153,154,155],[156,157,158],[159,160,161],[162,163,164],[165,166,167],[168,169,170],[171,172,173],[174,175,176],[177,178,179],[180,181,182],[183,184,185],[186,187,188],[189,190,191],[192,193,194],[195,196,197],[198,199,200],[201,202,203],[204,205,206],[207,208,209],[210,211,212],[213,214,215],[216,217,218],[219,220,221],[222,223,224],[225,226,227],[228,229,230],[231,232,233],[234,235,236],[237,238,239],[240,241,242],[243,244,245],[246,247,248],[249,250,251],[252,253,254],[255,256,257],[258,259,260],[261,262,263],[264,265,266],[267,268,269],[270,271,272],[273,274,275],[276,277,278],[279,280,281],[282,283,284],[285,286,287],[288,289,290],[291,292,293],[294,295,296],[297,298,299],[300,301,302],[303,304,305],[306,307,308],[309,310,311],[312,313,314],[315,316,317],[318,319,320],[321,322,323],[324,325,326],[327,328,329],[330,331,332],[333,334,335],[336,337,338],[339,340,341],[342,343,344],[345,346,347],[348,349,350],[351,352,353],[354,355,356],[357,358,359],[360,361,362],[363,364,365],[366,367,368],[369,370,371],[372,373,374],[375,376,377],[378,379,380],[381,382,383],[384,385,386],[387,388,389],[390,391,392],[393,394,395],[396,397,398],[399,400,401],[402,403,404],[405,406,407],[408,409,410],[411,412,413],[414,415,416],[417,418,419],[420,421,422],[423,424,425],[426,427,428],[429,430,431],[432,433,434],[435,436,437],[438,439,440],[441,442,443],[444,445,446],[447,448,449],[450,451,452],[453,454,455],[456,457,458],[459,460,461],[462,463,464],[465,466,467],[468,469,470],[471,472,473],[474,475,476],[477,478,479],[480,481,482],[483,484,485],[486,487,488],[489,490,491],[492,493,494],[495,496,497],[498,499,500],[501,502,503],[504,505,506],[507,508,509],[510,511,512],[513,514,515],[516,517,518],[519,520,521],[522,523,524],[525,526,527],[528,529,530],[531,532,533],[534,535,536],[537,538,539],[540,541,542],[543,544,545],[546,547,548],[549,550,551],[552,553,554],[555,556,557],[558,559,560],[561,562,563],[564,565,566],[567,568,569],[570,571,572],[573,574,575],[576,577,578],[579,580,581],[582,583,584],[585,586,587],[588,589,590],[591,592,593],[594,595,596],[597,598,599],[600,601,602],[603,604,605],[606,607,608],[609,610,611],[612,613,614],[615,616,617],[618,619,620],[621,622,623],[624,625,626],[627,628,629],[630,631,632],[633,634,635],[636,637,638],[639,640,641],[642,643,644],[645,646,647],[648,649,650],[651,652,653],[654,655,656],[657,658,659],[660,661,662],[663,664,665],[666,667,668],[669,670,671],[672,673,674],[675,676,677],[678,679,680],[681,682,683],[684,685,686],[687,688,689],[690,691,692],[693,694,695],[696,697,698],[699,700,701],[702,703,704],[705,706,707],[708,709,710],[711,712,713],[714,715,716],[717,718,719],[720,721,722],[723,724,725],[726,727,728],[729,730,731],[732,733,734],[735,736,737],[738,739,740],[741,742,743],[744,745,746],[747,748,749],[750,751,752],[753,754,755],[756,757,758],[759,760,761],[762,763,764],[765,766,767],[768,769,770],[771,772,773],[774,775,776],[777,778,779],[780,781,782],[783,784,785],[786,787,788],[789,790,791],[792,793,794],[795,796,797],[798,799,800],[801,802,803],[804,805,806],[807,808,809],[810,811,812],[813,814,815],[816,817,818],[819,820,821],[822,823,824],[825,826,827],[828,829,830],[831,832,833],[834,835,836],[837,838,839],[840,841,842],[843,844,845],[846,847,848],[849,850,851],[852,853,854],[855,856,857],[858,859,860],[861,862,863],[864,865,866],[867,868,869],[870,871,872],[873,874,875]]]
;
